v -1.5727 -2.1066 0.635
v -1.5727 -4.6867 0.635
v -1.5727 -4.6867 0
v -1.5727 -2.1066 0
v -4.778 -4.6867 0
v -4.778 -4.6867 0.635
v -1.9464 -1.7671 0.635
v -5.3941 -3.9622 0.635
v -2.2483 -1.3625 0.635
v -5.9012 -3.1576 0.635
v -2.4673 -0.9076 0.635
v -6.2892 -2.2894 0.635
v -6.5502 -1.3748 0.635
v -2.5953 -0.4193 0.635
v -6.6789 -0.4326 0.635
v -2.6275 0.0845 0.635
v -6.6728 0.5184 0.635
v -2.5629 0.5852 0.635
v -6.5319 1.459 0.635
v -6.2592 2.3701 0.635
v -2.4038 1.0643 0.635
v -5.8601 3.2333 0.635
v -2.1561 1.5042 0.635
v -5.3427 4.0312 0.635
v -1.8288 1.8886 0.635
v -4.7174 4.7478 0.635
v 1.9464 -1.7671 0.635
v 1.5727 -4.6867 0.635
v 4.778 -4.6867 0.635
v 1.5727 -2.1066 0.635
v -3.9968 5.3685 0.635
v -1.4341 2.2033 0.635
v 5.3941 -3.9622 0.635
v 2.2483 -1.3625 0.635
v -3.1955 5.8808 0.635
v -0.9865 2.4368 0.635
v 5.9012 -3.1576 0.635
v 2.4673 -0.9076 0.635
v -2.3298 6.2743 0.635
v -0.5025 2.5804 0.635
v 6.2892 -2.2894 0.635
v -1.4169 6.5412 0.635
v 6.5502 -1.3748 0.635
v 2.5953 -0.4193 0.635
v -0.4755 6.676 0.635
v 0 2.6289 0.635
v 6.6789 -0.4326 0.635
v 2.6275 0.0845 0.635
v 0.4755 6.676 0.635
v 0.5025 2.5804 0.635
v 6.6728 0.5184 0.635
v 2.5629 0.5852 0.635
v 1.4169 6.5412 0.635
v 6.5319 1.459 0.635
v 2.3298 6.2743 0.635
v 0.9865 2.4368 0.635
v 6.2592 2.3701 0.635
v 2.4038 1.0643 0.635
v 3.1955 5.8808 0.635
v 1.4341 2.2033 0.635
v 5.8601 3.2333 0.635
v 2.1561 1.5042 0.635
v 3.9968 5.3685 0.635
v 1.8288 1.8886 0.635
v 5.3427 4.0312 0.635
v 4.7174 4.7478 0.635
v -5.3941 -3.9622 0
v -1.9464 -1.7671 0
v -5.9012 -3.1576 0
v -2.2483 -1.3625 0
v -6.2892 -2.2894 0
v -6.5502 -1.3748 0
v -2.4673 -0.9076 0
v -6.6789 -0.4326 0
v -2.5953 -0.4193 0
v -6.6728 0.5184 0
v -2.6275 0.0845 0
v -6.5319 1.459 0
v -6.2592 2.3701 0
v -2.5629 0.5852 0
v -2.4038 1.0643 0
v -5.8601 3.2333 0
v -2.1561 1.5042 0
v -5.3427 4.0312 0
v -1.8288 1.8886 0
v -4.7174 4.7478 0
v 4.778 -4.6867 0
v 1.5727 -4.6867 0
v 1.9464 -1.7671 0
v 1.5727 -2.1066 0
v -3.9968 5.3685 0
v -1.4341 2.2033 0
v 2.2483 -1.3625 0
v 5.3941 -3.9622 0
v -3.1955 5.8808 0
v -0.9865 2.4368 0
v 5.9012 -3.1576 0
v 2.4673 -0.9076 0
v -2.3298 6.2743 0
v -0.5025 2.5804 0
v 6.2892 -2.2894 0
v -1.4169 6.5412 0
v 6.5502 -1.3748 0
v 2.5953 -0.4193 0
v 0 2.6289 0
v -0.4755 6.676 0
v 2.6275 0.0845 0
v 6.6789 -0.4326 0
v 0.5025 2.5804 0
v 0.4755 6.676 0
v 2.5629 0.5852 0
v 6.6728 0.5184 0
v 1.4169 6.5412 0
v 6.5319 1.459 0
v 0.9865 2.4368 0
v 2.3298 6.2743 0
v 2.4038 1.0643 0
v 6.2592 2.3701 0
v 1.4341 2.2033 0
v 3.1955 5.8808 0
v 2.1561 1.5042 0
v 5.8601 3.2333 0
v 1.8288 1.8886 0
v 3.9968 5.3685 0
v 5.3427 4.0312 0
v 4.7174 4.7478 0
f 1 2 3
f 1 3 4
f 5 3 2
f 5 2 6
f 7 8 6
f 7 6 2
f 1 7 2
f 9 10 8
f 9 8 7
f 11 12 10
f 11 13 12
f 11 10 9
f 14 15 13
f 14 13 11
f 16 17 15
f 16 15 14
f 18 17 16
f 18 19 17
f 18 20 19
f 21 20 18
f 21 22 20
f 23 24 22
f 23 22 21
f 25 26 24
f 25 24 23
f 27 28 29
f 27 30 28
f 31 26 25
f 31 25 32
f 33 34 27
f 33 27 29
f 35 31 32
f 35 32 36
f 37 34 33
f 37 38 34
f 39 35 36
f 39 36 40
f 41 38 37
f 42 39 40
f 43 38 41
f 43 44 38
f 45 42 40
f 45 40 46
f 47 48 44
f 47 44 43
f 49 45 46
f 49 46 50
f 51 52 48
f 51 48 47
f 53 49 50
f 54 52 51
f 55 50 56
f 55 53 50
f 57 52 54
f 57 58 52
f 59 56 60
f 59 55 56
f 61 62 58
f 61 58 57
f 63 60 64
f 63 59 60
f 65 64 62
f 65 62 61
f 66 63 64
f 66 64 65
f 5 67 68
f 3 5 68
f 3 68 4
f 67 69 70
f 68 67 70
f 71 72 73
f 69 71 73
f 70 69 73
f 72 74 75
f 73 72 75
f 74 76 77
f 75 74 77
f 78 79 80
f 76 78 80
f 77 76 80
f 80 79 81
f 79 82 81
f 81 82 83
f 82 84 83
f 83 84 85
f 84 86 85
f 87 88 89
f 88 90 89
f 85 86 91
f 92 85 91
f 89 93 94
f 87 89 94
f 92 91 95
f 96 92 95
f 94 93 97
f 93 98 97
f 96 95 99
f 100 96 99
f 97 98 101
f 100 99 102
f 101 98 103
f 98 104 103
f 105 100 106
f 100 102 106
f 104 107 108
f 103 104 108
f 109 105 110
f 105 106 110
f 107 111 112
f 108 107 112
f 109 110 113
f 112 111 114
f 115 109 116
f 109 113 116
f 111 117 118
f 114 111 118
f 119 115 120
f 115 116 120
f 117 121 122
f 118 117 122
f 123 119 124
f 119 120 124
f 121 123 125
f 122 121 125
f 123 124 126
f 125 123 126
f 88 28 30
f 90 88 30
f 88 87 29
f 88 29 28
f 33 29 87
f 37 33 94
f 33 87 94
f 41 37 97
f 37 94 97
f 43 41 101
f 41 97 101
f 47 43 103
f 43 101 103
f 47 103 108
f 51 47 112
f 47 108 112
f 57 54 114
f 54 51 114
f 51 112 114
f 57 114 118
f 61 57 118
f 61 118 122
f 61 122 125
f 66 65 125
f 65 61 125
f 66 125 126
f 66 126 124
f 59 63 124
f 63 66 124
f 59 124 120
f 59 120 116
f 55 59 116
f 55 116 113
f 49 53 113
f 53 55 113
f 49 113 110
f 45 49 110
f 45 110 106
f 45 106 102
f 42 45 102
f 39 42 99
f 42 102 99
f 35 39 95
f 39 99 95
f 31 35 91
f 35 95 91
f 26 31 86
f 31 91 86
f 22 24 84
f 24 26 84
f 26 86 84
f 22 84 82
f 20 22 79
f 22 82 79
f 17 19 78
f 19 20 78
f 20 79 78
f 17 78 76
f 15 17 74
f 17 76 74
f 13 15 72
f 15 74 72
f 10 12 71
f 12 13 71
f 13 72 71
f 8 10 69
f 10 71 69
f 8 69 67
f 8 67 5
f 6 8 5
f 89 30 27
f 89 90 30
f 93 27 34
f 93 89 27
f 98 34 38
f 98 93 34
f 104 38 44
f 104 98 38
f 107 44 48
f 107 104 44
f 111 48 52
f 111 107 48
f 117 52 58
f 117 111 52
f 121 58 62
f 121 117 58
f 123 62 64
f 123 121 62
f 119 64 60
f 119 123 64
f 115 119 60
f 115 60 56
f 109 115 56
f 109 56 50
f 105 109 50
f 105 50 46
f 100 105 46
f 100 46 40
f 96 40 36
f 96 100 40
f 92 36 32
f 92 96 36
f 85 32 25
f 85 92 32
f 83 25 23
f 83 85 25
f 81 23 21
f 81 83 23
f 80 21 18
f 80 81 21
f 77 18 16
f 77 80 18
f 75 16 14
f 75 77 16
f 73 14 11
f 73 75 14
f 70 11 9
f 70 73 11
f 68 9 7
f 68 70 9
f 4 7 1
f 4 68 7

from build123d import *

# Parameters (mm, degrees)
SKETCH1_R      = 6.6929
SKETCH1_R_2    = 2.6289
EXTRUDE1_DEPTH = 0.635
EXTRUDE2_START = -0.635
EXTRUDE2_DEPTH = 0.635
SKETCH5_W      = 3.145443006
SKETCH5_H      = 4.115631968
EXTRUDE3_DEPTH = 0.635


# Read off the part's stored shape, not the designer's step: Extrude2
with BuildPart() as part:
    # Sketch1 → Extrude1 (new body)
    with BuildSketch(Plane.XY):
        Circle(SKETCH1_R)
        Circle(SKETCH1_R_2, mode=Mode.SUBTRACT)
    extrude(amount=EXTRUDE1_DEPTH)

    # Extrude2 outline → Extrude2 (cut)
    with BuildSketch(Plane.XY.offset(0.635).offset(EXTRUDE2_START)):
        with BuildLine():
            Line((4.778033454, -4.686715984), (-4.778033454, -4.686715984))
            ThreePointArc((-4.778033454, -4.686715984), (0, -6.6929), (4.778033454, -4.686715984))
        make_face()
    extrude(amount=EXTRUDE2_DEPTH, mode=Mode.SUBTRACT)

    # Sketch5 → Extrude3 (cut)
    with BuildSketch(Plane.XY.offset(0.635)):
        with Locations((0, -2.6289)):
            Rectangle(SKETCH5_W, SKETCH5_H)
    extrude(amount=-EXTRUDE3_DEPTH, mode=Mode.SUBTRACT)


solid = part.part
